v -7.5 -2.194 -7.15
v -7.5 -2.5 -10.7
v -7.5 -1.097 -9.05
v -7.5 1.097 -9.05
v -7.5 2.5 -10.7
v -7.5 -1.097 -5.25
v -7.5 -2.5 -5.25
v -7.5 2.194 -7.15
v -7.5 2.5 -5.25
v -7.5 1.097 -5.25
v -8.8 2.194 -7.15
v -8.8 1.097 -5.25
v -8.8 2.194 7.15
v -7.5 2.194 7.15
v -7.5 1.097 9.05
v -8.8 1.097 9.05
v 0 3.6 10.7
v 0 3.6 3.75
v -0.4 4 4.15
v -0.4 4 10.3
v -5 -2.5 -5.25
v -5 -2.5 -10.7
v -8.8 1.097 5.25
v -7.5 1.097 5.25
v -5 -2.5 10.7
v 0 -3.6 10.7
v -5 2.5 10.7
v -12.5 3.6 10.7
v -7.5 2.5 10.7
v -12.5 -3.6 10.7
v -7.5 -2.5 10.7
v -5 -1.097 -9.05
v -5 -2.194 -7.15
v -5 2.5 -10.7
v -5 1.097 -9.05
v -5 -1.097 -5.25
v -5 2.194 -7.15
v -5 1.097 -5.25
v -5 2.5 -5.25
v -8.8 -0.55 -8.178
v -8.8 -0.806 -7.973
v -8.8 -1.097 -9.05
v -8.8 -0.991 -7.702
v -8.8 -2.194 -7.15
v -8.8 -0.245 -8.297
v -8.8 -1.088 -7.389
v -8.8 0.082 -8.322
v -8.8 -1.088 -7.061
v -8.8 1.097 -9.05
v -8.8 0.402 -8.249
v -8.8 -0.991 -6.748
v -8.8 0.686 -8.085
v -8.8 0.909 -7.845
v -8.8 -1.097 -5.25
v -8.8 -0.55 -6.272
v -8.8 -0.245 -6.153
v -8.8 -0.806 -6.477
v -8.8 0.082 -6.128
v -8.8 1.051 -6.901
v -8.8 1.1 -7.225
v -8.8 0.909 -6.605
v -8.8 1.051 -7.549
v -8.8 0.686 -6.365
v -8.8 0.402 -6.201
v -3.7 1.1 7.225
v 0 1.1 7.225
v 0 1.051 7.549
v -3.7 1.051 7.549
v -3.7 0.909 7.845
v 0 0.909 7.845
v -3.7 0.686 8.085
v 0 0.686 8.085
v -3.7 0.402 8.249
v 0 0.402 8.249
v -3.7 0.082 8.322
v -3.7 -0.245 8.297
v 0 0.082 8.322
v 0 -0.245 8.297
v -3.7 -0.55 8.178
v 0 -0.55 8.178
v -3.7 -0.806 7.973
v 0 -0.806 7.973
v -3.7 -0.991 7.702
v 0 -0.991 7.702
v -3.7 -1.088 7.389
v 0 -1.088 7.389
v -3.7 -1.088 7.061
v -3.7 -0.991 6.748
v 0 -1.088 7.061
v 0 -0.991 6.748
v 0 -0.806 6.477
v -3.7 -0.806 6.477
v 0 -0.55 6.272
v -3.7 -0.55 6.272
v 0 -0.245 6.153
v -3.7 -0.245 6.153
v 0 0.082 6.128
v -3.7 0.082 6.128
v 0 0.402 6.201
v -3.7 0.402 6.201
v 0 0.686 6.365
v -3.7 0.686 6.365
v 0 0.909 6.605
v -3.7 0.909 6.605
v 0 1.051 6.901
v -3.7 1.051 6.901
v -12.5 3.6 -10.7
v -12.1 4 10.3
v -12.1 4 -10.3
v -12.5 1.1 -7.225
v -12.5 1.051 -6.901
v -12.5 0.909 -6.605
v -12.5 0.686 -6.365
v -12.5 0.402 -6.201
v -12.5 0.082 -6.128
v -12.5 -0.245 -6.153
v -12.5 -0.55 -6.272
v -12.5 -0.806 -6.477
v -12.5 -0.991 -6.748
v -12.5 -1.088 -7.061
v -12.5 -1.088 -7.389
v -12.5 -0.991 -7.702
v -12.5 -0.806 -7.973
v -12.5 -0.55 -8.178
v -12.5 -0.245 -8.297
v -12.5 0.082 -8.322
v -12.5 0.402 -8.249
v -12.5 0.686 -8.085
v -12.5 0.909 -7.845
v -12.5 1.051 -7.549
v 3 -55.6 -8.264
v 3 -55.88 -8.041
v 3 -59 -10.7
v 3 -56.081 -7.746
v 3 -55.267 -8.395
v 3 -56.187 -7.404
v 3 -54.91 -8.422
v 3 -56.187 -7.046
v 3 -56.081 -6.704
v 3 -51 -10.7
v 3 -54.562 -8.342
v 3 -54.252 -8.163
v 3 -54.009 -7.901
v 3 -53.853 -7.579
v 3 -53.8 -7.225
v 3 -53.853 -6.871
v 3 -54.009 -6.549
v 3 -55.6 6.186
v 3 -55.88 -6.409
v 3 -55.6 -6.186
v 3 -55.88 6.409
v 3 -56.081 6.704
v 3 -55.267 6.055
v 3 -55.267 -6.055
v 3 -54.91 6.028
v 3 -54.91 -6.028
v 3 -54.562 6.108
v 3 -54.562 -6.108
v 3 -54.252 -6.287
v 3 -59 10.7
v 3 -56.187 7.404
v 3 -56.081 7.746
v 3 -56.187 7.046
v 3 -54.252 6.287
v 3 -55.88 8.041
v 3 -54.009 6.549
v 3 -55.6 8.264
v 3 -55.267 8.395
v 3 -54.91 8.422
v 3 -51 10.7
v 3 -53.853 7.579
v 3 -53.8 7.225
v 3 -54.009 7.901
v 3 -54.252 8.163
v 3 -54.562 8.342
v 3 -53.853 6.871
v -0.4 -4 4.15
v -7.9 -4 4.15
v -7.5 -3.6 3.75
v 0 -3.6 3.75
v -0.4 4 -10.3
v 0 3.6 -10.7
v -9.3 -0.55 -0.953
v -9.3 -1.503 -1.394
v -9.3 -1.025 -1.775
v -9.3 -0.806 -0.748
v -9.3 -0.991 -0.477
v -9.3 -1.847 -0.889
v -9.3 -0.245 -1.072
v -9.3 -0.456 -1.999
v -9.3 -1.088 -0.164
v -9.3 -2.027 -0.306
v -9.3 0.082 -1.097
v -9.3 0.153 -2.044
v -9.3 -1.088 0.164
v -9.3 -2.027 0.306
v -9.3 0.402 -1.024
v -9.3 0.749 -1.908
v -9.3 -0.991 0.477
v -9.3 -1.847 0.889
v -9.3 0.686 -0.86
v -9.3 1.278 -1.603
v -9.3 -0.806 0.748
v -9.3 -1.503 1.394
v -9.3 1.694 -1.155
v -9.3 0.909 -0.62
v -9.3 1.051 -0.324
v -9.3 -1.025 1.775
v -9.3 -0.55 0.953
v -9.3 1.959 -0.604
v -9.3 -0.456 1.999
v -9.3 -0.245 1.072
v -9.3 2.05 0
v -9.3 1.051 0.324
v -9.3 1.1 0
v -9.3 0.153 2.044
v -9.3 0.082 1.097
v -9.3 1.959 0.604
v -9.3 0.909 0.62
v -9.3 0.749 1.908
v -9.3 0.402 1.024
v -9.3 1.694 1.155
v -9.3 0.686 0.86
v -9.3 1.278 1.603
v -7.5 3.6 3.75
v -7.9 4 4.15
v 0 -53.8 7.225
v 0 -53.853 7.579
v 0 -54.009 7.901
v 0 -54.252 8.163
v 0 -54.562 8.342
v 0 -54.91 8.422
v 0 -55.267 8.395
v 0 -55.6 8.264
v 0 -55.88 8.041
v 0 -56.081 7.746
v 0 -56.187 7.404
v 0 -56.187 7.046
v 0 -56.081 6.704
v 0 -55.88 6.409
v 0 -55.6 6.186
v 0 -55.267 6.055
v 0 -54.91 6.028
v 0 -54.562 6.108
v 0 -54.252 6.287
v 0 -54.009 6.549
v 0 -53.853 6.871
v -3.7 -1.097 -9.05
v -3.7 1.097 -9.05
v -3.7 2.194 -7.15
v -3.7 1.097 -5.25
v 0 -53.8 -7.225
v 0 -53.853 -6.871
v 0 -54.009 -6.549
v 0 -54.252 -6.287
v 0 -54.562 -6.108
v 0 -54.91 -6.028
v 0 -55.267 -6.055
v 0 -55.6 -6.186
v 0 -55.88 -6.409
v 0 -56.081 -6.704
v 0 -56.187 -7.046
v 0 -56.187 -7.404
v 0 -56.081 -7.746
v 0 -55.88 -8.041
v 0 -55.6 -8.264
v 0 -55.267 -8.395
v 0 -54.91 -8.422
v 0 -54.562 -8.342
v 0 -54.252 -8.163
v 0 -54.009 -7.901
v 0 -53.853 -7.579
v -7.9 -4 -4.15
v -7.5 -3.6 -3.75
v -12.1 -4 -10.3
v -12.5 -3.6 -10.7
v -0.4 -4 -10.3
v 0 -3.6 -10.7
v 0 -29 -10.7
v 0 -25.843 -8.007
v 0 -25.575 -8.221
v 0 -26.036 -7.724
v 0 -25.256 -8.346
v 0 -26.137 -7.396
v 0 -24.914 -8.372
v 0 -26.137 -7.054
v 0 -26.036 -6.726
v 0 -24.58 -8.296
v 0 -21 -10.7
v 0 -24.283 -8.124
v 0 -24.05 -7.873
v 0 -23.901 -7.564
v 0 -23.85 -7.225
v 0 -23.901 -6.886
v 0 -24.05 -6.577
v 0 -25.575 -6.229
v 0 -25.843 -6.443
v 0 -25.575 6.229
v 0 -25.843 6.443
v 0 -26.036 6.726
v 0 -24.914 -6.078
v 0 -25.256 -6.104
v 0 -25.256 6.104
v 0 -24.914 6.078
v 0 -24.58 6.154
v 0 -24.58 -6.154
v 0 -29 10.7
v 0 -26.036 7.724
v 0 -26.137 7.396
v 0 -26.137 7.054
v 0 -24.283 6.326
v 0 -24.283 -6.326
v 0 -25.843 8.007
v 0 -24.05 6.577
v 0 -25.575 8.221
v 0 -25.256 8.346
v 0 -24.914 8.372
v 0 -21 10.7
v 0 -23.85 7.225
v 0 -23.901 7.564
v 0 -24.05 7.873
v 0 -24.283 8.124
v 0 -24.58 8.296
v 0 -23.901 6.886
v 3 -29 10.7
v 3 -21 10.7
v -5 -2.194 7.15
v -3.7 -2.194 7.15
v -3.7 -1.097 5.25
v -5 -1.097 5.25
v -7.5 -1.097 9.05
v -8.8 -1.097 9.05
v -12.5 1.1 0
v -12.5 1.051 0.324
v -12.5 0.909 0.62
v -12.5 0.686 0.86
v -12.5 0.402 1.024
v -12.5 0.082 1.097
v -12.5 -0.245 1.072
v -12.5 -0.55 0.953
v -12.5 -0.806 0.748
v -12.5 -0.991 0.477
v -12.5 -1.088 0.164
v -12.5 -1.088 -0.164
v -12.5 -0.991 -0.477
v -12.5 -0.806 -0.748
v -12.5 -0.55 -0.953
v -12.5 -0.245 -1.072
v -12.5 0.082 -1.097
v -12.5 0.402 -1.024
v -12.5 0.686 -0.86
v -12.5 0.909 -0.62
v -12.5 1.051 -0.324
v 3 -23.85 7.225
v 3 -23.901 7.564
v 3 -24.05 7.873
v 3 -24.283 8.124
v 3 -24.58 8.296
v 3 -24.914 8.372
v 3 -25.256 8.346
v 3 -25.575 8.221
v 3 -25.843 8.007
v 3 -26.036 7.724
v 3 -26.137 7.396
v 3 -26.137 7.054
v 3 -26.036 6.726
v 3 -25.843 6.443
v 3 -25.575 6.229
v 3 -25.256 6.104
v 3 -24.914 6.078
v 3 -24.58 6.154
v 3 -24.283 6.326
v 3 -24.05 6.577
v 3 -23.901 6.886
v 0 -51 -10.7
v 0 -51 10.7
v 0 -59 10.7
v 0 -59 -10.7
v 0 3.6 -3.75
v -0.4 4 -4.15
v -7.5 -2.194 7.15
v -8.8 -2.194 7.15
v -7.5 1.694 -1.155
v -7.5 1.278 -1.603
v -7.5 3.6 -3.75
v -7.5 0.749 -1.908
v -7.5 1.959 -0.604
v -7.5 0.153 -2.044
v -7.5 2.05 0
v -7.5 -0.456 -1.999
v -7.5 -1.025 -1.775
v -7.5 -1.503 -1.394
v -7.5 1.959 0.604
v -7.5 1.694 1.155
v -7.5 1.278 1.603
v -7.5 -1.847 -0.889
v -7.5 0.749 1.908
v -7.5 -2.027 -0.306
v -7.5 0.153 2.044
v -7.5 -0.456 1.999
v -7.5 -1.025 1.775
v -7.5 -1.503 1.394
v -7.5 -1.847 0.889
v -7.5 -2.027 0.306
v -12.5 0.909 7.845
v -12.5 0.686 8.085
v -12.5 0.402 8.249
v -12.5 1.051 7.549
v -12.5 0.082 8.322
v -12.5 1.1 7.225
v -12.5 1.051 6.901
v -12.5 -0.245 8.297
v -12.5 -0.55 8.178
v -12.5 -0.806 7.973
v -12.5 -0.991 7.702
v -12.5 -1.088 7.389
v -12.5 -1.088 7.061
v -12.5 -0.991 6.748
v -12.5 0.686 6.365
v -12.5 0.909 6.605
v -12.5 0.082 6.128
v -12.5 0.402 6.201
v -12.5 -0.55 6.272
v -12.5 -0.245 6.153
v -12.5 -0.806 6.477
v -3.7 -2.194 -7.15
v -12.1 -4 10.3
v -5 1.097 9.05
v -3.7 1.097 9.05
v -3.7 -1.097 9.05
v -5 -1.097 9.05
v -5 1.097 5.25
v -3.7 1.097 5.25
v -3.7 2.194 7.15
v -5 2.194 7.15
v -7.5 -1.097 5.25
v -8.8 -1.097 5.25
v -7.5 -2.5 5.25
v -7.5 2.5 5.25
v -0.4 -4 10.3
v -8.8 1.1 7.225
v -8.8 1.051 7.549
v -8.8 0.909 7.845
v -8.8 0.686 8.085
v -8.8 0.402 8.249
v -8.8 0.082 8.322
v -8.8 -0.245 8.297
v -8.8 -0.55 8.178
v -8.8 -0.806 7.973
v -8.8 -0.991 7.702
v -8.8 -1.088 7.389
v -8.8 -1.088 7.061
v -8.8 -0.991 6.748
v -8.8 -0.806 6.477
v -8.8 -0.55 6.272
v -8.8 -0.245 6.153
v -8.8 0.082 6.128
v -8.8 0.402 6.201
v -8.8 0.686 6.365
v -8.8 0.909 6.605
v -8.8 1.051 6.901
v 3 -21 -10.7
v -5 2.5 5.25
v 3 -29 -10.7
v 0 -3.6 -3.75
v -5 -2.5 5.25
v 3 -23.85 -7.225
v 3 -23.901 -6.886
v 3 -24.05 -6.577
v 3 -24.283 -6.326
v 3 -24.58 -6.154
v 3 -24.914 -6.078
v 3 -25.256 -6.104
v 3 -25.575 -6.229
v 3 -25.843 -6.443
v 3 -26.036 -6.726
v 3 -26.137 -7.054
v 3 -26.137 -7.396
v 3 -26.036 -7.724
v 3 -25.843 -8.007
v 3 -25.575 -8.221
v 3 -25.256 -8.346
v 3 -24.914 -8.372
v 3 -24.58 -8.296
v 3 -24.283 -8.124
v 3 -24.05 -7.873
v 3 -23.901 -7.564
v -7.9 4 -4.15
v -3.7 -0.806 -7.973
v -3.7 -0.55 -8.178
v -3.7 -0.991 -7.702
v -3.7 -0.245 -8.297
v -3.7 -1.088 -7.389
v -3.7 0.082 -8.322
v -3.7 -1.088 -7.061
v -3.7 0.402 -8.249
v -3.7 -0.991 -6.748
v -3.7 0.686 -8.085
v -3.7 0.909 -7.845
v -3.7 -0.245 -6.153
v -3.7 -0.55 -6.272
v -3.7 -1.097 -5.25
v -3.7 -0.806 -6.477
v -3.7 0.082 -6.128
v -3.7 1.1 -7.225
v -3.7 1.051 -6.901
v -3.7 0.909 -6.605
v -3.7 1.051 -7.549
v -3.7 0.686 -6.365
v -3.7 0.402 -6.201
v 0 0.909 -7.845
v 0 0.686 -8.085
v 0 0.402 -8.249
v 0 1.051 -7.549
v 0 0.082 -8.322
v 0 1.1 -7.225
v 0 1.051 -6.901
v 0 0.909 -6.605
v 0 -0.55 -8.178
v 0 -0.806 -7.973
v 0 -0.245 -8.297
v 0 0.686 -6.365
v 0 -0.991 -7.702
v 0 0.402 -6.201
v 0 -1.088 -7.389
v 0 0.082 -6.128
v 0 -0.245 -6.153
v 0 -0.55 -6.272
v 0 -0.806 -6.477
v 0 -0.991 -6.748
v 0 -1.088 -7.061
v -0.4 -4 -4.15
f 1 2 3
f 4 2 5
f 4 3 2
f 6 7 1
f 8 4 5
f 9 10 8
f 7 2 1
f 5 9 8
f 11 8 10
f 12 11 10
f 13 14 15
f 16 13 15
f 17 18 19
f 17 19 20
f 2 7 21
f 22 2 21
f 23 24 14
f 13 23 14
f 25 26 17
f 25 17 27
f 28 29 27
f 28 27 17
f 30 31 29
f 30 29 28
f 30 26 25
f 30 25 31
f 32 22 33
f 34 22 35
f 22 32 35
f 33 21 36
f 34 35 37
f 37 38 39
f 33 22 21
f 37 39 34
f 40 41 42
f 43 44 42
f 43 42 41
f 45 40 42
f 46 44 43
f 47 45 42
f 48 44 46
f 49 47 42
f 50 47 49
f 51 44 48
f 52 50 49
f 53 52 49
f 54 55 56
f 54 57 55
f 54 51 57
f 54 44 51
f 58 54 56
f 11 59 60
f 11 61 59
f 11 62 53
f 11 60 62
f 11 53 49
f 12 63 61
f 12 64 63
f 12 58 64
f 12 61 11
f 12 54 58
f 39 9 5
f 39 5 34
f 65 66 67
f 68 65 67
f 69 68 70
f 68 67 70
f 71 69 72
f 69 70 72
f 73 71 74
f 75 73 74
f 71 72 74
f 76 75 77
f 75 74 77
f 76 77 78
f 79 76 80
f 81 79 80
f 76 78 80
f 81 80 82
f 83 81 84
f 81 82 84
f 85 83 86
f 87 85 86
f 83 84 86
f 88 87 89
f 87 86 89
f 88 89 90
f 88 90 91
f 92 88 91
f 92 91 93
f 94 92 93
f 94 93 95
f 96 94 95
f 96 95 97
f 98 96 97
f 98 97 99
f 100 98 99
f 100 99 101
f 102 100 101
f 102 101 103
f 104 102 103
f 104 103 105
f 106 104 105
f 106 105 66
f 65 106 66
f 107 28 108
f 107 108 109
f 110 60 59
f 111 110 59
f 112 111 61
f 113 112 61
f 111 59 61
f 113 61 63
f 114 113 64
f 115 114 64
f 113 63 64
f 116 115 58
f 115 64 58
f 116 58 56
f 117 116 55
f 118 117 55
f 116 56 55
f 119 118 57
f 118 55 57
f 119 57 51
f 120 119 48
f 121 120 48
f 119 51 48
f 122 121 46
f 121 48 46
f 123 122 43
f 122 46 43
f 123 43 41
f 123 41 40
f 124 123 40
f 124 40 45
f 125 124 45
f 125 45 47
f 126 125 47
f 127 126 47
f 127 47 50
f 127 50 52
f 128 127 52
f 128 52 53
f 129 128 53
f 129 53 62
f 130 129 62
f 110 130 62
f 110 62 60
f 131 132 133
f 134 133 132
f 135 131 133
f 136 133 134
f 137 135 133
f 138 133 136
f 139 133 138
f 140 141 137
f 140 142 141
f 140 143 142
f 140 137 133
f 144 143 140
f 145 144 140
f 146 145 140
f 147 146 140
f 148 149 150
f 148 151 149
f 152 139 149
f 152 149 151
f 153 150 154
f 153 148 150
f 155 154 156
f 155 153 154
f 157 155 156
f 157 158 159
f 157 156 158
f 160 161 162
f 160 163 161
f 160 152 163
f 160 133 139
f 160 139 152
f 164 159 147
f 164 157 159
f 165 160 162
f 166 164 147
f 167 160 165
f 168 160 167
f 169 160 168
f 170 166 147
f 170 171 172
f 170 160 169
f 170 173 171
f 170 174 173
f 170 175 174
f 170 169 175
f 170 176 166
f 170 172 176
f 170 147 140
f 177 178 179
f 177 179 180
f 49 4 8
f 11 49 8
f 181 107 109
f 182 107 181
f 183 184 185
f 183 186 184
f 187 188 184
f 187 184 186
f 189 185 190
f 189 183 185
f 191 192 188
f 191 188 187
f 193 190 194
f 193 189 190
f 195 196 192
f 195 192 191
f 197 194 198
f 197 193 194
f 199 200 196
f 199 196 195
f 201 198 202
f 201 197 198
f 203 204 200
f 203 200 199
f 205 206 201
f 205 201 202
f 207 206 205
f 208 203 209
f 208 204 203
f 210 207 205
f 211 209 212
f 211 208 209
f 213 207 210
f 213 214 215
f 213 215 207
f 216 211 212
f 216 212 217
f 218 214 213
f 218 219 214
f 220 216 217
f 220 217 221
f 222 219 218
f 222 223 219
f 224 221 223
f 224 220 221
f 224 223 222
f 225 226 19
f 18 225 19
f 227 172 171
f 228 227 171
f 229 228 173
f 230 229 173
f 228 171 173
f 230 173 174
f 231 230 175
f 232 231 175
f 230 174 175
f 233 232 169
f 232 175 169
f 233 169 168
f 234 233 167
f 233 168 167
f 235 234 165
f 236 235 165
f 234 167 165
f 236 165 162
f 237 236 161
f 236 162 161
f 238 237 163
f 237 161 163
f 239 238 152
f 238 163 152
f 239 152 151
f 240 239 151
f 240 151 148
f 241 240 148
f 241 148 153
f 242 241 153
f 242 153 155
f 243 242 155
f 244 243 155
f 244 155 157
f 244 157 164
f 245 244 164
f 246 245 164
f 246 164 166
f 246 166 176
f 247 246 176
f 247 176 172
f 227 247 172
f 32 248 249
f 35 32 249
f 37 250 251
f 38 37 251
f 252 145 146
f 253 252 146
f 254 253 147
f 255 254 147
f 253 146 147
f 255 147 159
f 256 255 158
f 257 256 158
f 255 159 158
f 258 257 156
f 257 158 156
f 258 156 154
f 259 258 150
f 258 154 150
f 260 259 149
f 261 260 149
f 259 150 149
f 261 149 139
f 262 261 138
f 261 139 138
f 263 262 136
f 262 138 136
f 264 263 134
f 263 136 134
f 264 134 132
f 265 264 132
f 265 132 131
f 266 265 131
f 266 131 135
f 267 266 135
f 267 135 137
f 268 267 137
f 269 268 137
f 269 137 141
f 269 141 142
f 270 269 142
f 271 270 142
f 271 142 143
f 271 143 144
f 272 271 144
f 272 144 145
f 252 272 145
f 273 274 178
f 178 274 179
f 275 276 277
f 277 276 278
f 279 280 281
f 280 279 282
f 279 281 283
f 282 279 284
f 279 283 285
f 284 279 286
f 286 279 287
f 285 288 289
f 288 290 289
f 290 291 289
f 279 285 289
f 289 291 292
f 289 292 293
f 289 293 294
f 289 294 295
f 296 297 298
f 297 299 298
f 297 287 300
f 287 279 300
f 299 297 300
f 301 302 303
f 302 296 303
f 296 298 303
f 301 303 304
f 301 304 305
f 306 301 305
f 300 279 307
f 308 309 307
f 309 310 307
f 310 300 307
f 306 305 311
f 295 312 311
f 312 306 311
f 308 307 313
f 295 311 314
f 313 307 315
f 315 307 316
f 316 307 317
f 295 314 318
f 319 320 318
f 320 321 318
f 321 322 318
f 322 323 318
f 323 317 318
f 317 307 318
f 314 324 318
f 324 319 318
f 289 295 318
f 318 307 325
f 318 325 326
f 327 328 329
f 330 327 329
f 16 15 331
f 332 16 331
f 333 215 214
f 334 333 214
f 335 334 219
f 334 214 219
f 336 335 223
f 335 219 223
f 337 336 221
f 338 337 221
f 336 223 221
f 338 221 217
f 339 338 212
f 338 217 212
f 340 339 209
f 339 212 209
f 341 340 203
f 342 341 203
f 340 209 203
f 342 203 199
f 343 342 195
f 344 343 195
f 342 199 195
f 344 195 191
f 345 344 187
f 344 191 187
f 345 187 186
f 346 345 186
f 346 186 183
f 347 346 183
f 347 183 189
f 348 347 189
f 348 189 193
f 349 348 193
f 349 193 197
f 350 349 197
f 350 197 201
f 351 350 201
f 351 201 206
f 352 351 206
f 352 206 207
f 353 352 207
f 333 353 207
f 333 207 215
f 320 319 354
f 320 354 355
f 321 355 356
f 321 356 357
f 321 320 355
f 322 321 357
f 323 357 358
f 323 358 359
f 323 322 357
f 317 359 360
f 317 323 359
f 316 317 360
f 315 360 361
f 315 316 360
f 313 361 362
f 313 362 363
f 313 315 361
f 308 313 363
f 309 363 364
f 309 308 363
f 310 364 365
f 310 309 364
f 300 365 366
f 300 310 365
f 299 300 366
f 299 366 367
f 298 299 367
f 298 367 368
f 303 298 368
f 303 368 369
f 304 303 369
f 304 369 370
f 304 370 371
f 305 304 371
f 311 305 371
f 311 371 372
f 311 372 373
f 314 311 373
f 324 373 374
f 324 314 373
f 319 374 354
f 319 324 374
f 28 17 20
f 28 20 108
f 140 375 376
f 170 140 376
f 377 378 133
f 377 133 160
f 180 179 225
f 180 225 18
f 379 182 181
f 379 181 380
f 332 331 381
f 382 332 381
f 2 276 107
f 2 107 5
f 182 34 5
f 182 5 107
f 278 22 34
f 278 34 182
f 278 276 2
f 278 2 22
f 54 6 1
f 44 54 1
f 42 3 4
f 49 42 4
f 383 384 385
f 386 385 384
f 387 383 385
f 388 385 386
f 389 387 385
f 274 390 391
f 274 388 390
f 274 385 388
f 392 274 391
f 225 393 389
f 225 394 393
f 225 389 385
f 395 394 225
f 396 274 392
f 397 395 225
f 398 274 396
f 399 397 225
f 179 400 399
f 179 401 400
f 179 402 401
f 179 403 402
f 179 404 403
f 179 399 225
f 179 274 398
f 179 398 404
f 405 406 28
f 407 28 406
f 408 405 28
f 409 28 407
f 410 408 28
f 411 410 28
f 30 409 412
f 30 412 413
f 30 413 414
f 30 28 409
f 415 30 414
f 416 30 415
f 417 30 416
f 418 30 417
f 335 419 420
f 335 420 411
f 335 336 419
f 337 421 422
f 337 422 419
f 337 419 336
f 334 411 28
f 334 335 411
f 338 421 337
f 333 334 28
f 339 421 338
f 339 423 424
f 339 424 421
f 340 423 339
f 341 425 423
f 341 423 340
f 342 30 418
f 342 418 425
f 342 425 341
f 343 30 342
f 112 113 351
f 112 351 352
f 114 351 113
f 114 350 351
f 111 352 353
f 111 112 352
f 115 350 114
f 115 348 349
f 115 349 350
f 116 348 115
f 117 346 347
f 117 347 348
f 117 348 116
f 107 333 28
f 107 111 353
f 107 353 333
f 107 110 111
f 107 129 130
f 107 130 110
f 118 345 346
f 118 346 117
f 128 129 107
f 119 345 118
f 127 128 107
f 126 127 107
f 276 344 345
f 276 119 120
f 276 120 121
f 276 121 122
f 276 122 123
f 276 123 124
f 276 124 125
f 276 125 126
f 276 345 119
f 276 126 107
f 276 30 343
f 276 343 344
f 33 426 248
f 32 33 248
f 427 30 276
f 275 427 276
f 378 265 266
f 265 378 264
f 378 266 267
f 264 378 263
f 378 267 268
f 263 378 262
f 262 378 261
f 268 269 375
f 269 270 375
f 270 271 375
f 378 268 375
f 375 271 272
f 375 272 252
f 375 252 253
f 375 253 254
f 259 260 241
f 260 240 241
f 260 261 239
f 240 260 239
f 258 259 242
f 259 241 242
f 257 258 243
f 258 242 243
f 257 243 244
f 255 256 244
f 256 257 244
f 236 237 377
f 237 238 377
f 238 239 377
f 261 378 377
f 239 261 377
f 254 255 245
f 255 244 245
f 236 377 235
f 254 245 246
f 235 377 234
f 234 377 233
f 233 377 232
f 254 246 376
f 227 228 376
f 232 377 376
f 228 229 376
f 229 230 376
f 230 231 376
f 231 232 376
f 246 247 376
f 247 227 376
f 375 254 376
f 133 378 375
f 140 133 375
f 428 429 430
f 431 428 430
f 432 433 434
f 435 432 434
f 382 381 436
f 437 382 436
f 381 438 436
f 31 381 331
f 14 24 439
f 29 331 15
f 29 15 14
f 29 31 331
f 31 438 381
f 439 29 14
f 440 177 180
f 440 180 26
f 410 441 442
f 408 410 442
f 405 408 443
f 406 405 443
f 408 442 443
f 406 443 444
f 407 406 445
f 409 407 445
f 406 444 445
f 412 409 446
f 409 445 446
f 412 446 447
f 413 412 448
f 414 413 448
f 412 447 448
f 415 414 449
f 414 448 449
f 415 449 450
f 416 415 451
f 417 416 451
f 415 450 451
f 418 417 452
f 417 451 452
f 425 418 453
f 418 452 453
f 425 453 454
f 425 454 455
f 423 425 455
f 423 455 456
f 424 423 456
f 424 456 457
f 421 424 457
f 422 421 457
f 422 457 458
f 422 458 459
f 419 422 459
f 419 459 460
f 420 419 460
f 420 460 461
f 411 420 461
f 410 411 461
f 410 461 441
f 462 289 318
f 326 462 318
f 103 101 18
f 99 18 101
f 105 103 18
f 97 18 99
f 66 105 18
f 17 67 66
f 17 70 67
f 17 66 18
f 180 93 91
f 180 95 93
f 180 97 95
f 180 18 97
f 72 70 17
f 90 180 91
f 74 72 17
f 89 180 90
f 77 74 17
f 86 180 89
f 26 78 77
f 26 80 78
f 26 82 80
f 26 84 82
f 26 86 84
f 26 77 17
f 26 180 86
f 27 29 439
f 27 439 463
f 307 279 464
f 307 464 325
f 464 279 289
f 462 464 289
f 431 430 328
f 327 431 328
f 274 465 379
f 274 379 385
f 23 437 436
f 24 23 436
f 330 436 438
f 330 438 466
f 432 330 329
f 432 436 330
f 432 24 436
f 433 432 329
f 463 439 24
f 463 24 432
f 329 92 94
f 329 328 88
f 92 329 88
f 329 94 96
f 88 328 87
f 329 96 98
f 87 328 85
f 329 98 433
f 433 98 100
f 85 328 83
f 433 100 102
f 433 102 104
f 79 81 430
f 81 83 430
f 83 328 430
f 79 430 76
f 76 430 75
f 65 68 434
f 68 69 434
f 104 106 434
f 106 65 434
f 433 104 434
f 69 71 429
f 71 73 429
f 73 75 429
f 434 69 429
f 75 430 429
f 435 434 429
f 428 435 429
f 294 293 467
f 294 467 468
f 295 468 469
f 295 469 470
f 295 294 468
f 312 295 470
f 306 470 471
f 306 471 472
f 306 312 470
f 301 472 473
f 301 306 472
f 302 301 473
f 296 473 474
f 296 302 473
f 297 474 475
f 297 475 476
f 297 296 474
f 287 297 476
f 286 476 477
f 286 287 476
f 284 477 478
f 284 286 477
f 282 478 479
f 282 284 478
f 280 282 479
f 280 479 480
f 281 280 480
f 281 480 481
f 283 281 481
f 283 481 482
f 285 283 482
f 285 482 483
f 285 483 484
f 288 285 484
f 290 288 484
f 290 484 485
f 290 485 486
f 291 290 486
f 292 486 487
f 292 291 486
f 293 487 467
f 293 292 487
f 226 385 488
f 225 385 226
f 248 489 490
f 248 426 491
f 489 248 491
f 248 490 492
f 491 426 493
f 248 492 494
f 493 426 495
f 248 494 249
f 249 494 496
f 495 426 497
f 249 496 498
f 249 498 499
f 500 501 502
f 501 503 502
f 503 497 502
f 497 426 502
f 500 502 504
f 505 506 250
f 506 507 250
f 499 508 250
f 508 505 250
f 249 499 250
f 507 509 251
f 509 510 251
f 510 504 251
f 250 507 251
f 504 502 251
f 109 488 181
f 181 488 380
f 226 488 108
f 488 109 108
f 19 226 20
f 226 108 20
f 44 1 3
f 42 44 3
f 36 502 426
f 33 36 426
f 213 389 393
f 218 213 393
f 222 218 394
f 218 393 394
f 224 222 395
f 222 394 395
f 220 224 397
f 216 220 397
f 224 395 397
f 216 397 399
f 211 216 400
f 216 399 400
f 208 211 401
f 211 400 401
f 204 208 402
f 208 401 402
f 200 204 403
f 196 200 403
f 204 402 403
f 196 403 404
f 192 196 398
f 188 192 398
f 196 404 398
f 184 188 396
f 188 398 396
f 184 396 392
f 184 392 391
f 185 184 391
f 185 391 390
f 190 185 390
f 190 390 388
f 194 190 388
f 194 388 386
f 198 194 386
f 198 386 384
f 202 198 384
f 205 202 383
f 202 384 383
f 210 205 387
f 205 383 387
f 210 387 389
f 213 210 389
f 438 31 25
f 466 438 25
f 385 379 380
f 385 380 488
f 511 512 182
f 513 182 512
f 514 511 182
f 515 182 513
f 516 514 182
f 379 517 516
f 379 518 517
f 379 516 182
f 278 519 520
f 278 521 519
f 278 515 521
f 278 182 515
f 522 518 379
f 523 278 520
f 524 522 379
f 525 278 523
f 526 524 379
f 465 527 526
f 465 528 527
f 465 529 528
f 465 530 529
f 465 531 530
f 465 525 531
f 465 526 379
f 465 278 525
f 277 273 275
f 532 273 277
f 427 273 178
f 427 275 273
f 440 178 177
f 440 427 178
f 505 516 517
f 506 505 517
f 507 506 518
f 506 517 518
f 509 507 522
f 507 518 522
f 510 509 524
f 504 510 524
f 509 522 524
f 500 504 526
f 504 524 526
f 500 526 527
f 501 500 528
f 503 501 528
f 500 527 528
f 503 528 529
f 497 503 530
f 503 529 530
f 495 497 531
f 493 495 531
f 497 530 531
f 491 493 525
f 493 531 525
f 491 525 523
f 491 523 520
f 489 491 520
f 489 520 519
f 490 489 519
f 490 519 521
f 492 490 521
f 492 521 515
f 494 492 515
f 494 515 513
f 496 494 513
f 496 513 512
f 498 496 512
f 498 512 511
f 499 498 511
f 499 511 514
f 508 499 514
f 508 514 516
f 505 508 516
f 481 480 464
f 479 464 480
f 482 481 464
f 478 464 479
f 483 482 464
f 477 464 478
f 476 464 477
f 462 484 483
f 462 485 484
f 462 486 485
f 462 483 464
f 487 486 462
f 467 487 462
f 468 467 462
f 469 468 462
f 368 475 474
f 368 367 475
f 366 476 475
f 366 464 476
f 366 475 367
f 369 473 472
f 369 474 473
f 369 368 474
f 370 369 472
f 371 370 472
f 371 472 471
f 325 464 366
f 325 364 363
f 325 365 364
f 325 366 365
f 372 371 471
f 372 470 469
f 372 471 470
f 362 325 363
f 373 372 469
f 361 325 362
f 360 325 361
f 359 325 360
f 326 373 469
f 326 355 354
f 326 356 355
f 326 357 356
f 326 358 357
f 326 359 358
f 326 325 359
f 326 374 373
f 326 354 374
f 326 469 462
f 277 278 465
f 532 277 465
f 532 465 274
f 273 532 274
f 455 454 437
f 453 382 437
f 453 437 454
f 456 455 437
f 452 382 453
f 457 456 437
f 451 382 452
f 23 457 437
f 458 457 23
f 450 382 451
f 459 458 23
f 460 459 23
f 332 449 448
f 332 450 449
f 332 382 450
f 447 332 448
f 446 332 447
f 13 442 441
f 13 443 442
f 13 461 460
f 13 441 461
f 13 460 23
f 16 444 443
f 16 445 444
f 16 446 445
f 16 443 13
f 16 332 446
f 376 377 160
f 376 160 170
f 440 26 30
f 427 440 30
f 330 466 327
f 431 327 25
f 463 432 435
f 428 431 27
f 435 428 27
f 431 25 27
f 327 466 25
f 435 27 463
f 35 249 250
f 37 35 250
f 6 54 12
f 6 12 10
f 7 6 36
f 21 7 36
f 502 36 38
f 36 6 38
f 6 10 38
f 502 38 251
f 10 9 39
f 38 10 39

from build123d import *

# Parameters (mm, degrees)
F2_DEPTH  = 4
F4_START  = -3.7
F4_DEPTH  = 1.7
F5_W      = 2.5
F5_H      = 5
F6_DEPTH  = 5.45
F7_R      = 1.1
F8_DEPTH  = 12.501
F9_START  = -15.95
F9_DEPTH  = 5.45
F10_START = -7.1
F10_DEPTH = 1.7
F11_R     = 1.1
F13_DEPTH = 5
F12_R     = 2.05
F14_DEPTH = 1.8
F16_W     = 8
F16_H     = 21.4
F16_R     = 1.15
F17_DEPTH = 3
F20_R     = 1.2
F21_DEPTH = 15.501
F22_SIZE  = 0.4


with BuildPart() as f2:
    # F1 (on Front) → F2 (new body, symmetric)
    with BuildSketch(Plane.XZ):
        Polygon((-7.5, 3.75), (0, 3.75), (0, 10.7), (-12.5, 10.7), (-12.5, -10.7), (0, -10.7), (0, -3.75), (-7.5, -3.75), align=None)
    extrude(amount=F2_DEPTH, both=True)

    # F3 (on face) → F4 (cut)
    with BuildSketch(Plane.YZ.offset(F4_START)):
        Polygon((-1.0969655115, 5.25), (0, 5.25), (1.0969655115, 5.25), (2.1939310229, 7.15), (1.0969655115, 9.05), (0, 9.05), (-1.0969655115, 9.05), (-2.1939310229, 7.15), align=None)
        Polygon((-2.1939310229, -7.15), (-1.0969655115, -9.05), (0, -9.05), (1.0969655115, -9.05), (2.1939310229, -7.15), (1.0969655115, -5.25), (0, -5.25), (-1.0969655115, -5.25), align=None)
    extrude(amount=-F4_DEPTH, mode=Mode.SUBTRACT)

    # F5 (on face) → F6 (cut, through all)
    with BuildSketch(Plane.XY.offset(10.7)):
        with Locations((-6.25, 0)):
            Rectangle(F5_W, F5_H)
    extrude(amount=-F6_DEPTH, mode=Mode.SUBTRACT)

    # F7 (on face) → F8 (cut, through all)
    with BuildSketch(Plane.YZ):
        with Locations((0, 7.225)):
            Circle(F7_R)
        with Locations((0, -7.225)):
            Circle(F7_R)
    extrude(amount=-F8_DEPTH, mode=Mode.SUBTRACT)

    # F5 (on face) → F9 (cut)
    with BuildSketch(Plane.XY.offset(10.7).offset(F9_START)):
        with Locations((-6.25, 0)):
            Rectangle(F5_W, F5_H)
    extrude(amount=-F9_DEPTH, mode=Mode.SUBTRACT)

    # F3 (on face) → F10 (cut)
    with BuildSketch(Plane.YZ.offset(F10_START)):
        Polygon((-1.0969655115, 5.25), (0, 5.25), (1.0969655115, 5.25), (2.1939310229, 7.15), (1.0969655115, 9.05), (0, 9.05), (-1.0969655115, 9.05), (-2.1939310229, 7.15), align=None)
        Polygon((-2.1939310229, -7.15), (-1.0969655115, -9.05), (0, -9.05), (1.0969655115, -9.05), (2.1939310229, -7.15), (1.0969655115, -5.25), (0, -5.25), (-1.0969655115, -5.25), align=None)
    extrude(amount=-F10_DEPTH, mode=Mode.SUBTRACT)

    # F11 (on face) → F13 (cut, through all)
    with BuildSketch(Plane.YZ.offset(-7.5)):
        Circle(F11_R)
    extrude(amount=-F13_DEPTH, mode=Mode.SUBTRACT)

    # F12 (on face) → F14 (cut)
    with BuildSketch(Plane.YZ.offset(-7.5)):
        Circle(F12_R)
    extrude(amount=-F14_DEPTH, mode=Mode.SUBTRACT)

    # F22
    f22_edges = [f2.edges().sort_by_distance(p)[0] for p in [
        (-7.5, -4, 0),
        (-3.75, -4, 3.75),
        (-3.75, -4, -3.75),
        (-3.75, 4, 3.75),
        (-7.5, 4, 0),
        (-3.75, 4, -3.75),
        (0, -4, 7.225),
        (0, 4, 7.225),
        (-6.25, 4, 10.7),
        (-6.25, -4, 10.7),
        (-12.5, -4, 0),
        (-12.5, 4, 0),
        (-6.25, 4, -10.7),
        (0, 4, -7.225),
        (0, -4, -7.225),
        (-6.25, -4, -10.7),
    ]]
    chamfer(f22_edges, length=F22_SIZE)


with BuildPart() as f17:
    # F16 (on Right) → F17 (new body)
    with BuildSketch(Plane.YZ):
        with Locations((-25, 0)):
            Rectangle(F16_W, F16_H)
        with Locations((-25, -7.225)):
            Circle(F16_R, mode=Mode.SUBTRACT)
        with Locations((-25, 7.225)):
            Circle(F16_R, mode=Mode.SUBTRACT)
    extrude(amount=F17_DEPTH)


with BuildPart() as f19_1:
    # F19: copy of F17
    add(f17.part.moved(Location((0, -30, 0))))

    # F20 (on face) → F21 (cut, through all)
    with BuildSketch(Plane.YZ.offset(3)):
        with Locations((-55, 7.225)):
            Circle(F20_R)
        with Locations((-55, -7.225)):
            Circle(F20_R)
    extrude(amount=-F21_DEPTH, mode=Mode.SUBTRACT)


solid = Compound([f2.part, f17.part, f19_1.part])
